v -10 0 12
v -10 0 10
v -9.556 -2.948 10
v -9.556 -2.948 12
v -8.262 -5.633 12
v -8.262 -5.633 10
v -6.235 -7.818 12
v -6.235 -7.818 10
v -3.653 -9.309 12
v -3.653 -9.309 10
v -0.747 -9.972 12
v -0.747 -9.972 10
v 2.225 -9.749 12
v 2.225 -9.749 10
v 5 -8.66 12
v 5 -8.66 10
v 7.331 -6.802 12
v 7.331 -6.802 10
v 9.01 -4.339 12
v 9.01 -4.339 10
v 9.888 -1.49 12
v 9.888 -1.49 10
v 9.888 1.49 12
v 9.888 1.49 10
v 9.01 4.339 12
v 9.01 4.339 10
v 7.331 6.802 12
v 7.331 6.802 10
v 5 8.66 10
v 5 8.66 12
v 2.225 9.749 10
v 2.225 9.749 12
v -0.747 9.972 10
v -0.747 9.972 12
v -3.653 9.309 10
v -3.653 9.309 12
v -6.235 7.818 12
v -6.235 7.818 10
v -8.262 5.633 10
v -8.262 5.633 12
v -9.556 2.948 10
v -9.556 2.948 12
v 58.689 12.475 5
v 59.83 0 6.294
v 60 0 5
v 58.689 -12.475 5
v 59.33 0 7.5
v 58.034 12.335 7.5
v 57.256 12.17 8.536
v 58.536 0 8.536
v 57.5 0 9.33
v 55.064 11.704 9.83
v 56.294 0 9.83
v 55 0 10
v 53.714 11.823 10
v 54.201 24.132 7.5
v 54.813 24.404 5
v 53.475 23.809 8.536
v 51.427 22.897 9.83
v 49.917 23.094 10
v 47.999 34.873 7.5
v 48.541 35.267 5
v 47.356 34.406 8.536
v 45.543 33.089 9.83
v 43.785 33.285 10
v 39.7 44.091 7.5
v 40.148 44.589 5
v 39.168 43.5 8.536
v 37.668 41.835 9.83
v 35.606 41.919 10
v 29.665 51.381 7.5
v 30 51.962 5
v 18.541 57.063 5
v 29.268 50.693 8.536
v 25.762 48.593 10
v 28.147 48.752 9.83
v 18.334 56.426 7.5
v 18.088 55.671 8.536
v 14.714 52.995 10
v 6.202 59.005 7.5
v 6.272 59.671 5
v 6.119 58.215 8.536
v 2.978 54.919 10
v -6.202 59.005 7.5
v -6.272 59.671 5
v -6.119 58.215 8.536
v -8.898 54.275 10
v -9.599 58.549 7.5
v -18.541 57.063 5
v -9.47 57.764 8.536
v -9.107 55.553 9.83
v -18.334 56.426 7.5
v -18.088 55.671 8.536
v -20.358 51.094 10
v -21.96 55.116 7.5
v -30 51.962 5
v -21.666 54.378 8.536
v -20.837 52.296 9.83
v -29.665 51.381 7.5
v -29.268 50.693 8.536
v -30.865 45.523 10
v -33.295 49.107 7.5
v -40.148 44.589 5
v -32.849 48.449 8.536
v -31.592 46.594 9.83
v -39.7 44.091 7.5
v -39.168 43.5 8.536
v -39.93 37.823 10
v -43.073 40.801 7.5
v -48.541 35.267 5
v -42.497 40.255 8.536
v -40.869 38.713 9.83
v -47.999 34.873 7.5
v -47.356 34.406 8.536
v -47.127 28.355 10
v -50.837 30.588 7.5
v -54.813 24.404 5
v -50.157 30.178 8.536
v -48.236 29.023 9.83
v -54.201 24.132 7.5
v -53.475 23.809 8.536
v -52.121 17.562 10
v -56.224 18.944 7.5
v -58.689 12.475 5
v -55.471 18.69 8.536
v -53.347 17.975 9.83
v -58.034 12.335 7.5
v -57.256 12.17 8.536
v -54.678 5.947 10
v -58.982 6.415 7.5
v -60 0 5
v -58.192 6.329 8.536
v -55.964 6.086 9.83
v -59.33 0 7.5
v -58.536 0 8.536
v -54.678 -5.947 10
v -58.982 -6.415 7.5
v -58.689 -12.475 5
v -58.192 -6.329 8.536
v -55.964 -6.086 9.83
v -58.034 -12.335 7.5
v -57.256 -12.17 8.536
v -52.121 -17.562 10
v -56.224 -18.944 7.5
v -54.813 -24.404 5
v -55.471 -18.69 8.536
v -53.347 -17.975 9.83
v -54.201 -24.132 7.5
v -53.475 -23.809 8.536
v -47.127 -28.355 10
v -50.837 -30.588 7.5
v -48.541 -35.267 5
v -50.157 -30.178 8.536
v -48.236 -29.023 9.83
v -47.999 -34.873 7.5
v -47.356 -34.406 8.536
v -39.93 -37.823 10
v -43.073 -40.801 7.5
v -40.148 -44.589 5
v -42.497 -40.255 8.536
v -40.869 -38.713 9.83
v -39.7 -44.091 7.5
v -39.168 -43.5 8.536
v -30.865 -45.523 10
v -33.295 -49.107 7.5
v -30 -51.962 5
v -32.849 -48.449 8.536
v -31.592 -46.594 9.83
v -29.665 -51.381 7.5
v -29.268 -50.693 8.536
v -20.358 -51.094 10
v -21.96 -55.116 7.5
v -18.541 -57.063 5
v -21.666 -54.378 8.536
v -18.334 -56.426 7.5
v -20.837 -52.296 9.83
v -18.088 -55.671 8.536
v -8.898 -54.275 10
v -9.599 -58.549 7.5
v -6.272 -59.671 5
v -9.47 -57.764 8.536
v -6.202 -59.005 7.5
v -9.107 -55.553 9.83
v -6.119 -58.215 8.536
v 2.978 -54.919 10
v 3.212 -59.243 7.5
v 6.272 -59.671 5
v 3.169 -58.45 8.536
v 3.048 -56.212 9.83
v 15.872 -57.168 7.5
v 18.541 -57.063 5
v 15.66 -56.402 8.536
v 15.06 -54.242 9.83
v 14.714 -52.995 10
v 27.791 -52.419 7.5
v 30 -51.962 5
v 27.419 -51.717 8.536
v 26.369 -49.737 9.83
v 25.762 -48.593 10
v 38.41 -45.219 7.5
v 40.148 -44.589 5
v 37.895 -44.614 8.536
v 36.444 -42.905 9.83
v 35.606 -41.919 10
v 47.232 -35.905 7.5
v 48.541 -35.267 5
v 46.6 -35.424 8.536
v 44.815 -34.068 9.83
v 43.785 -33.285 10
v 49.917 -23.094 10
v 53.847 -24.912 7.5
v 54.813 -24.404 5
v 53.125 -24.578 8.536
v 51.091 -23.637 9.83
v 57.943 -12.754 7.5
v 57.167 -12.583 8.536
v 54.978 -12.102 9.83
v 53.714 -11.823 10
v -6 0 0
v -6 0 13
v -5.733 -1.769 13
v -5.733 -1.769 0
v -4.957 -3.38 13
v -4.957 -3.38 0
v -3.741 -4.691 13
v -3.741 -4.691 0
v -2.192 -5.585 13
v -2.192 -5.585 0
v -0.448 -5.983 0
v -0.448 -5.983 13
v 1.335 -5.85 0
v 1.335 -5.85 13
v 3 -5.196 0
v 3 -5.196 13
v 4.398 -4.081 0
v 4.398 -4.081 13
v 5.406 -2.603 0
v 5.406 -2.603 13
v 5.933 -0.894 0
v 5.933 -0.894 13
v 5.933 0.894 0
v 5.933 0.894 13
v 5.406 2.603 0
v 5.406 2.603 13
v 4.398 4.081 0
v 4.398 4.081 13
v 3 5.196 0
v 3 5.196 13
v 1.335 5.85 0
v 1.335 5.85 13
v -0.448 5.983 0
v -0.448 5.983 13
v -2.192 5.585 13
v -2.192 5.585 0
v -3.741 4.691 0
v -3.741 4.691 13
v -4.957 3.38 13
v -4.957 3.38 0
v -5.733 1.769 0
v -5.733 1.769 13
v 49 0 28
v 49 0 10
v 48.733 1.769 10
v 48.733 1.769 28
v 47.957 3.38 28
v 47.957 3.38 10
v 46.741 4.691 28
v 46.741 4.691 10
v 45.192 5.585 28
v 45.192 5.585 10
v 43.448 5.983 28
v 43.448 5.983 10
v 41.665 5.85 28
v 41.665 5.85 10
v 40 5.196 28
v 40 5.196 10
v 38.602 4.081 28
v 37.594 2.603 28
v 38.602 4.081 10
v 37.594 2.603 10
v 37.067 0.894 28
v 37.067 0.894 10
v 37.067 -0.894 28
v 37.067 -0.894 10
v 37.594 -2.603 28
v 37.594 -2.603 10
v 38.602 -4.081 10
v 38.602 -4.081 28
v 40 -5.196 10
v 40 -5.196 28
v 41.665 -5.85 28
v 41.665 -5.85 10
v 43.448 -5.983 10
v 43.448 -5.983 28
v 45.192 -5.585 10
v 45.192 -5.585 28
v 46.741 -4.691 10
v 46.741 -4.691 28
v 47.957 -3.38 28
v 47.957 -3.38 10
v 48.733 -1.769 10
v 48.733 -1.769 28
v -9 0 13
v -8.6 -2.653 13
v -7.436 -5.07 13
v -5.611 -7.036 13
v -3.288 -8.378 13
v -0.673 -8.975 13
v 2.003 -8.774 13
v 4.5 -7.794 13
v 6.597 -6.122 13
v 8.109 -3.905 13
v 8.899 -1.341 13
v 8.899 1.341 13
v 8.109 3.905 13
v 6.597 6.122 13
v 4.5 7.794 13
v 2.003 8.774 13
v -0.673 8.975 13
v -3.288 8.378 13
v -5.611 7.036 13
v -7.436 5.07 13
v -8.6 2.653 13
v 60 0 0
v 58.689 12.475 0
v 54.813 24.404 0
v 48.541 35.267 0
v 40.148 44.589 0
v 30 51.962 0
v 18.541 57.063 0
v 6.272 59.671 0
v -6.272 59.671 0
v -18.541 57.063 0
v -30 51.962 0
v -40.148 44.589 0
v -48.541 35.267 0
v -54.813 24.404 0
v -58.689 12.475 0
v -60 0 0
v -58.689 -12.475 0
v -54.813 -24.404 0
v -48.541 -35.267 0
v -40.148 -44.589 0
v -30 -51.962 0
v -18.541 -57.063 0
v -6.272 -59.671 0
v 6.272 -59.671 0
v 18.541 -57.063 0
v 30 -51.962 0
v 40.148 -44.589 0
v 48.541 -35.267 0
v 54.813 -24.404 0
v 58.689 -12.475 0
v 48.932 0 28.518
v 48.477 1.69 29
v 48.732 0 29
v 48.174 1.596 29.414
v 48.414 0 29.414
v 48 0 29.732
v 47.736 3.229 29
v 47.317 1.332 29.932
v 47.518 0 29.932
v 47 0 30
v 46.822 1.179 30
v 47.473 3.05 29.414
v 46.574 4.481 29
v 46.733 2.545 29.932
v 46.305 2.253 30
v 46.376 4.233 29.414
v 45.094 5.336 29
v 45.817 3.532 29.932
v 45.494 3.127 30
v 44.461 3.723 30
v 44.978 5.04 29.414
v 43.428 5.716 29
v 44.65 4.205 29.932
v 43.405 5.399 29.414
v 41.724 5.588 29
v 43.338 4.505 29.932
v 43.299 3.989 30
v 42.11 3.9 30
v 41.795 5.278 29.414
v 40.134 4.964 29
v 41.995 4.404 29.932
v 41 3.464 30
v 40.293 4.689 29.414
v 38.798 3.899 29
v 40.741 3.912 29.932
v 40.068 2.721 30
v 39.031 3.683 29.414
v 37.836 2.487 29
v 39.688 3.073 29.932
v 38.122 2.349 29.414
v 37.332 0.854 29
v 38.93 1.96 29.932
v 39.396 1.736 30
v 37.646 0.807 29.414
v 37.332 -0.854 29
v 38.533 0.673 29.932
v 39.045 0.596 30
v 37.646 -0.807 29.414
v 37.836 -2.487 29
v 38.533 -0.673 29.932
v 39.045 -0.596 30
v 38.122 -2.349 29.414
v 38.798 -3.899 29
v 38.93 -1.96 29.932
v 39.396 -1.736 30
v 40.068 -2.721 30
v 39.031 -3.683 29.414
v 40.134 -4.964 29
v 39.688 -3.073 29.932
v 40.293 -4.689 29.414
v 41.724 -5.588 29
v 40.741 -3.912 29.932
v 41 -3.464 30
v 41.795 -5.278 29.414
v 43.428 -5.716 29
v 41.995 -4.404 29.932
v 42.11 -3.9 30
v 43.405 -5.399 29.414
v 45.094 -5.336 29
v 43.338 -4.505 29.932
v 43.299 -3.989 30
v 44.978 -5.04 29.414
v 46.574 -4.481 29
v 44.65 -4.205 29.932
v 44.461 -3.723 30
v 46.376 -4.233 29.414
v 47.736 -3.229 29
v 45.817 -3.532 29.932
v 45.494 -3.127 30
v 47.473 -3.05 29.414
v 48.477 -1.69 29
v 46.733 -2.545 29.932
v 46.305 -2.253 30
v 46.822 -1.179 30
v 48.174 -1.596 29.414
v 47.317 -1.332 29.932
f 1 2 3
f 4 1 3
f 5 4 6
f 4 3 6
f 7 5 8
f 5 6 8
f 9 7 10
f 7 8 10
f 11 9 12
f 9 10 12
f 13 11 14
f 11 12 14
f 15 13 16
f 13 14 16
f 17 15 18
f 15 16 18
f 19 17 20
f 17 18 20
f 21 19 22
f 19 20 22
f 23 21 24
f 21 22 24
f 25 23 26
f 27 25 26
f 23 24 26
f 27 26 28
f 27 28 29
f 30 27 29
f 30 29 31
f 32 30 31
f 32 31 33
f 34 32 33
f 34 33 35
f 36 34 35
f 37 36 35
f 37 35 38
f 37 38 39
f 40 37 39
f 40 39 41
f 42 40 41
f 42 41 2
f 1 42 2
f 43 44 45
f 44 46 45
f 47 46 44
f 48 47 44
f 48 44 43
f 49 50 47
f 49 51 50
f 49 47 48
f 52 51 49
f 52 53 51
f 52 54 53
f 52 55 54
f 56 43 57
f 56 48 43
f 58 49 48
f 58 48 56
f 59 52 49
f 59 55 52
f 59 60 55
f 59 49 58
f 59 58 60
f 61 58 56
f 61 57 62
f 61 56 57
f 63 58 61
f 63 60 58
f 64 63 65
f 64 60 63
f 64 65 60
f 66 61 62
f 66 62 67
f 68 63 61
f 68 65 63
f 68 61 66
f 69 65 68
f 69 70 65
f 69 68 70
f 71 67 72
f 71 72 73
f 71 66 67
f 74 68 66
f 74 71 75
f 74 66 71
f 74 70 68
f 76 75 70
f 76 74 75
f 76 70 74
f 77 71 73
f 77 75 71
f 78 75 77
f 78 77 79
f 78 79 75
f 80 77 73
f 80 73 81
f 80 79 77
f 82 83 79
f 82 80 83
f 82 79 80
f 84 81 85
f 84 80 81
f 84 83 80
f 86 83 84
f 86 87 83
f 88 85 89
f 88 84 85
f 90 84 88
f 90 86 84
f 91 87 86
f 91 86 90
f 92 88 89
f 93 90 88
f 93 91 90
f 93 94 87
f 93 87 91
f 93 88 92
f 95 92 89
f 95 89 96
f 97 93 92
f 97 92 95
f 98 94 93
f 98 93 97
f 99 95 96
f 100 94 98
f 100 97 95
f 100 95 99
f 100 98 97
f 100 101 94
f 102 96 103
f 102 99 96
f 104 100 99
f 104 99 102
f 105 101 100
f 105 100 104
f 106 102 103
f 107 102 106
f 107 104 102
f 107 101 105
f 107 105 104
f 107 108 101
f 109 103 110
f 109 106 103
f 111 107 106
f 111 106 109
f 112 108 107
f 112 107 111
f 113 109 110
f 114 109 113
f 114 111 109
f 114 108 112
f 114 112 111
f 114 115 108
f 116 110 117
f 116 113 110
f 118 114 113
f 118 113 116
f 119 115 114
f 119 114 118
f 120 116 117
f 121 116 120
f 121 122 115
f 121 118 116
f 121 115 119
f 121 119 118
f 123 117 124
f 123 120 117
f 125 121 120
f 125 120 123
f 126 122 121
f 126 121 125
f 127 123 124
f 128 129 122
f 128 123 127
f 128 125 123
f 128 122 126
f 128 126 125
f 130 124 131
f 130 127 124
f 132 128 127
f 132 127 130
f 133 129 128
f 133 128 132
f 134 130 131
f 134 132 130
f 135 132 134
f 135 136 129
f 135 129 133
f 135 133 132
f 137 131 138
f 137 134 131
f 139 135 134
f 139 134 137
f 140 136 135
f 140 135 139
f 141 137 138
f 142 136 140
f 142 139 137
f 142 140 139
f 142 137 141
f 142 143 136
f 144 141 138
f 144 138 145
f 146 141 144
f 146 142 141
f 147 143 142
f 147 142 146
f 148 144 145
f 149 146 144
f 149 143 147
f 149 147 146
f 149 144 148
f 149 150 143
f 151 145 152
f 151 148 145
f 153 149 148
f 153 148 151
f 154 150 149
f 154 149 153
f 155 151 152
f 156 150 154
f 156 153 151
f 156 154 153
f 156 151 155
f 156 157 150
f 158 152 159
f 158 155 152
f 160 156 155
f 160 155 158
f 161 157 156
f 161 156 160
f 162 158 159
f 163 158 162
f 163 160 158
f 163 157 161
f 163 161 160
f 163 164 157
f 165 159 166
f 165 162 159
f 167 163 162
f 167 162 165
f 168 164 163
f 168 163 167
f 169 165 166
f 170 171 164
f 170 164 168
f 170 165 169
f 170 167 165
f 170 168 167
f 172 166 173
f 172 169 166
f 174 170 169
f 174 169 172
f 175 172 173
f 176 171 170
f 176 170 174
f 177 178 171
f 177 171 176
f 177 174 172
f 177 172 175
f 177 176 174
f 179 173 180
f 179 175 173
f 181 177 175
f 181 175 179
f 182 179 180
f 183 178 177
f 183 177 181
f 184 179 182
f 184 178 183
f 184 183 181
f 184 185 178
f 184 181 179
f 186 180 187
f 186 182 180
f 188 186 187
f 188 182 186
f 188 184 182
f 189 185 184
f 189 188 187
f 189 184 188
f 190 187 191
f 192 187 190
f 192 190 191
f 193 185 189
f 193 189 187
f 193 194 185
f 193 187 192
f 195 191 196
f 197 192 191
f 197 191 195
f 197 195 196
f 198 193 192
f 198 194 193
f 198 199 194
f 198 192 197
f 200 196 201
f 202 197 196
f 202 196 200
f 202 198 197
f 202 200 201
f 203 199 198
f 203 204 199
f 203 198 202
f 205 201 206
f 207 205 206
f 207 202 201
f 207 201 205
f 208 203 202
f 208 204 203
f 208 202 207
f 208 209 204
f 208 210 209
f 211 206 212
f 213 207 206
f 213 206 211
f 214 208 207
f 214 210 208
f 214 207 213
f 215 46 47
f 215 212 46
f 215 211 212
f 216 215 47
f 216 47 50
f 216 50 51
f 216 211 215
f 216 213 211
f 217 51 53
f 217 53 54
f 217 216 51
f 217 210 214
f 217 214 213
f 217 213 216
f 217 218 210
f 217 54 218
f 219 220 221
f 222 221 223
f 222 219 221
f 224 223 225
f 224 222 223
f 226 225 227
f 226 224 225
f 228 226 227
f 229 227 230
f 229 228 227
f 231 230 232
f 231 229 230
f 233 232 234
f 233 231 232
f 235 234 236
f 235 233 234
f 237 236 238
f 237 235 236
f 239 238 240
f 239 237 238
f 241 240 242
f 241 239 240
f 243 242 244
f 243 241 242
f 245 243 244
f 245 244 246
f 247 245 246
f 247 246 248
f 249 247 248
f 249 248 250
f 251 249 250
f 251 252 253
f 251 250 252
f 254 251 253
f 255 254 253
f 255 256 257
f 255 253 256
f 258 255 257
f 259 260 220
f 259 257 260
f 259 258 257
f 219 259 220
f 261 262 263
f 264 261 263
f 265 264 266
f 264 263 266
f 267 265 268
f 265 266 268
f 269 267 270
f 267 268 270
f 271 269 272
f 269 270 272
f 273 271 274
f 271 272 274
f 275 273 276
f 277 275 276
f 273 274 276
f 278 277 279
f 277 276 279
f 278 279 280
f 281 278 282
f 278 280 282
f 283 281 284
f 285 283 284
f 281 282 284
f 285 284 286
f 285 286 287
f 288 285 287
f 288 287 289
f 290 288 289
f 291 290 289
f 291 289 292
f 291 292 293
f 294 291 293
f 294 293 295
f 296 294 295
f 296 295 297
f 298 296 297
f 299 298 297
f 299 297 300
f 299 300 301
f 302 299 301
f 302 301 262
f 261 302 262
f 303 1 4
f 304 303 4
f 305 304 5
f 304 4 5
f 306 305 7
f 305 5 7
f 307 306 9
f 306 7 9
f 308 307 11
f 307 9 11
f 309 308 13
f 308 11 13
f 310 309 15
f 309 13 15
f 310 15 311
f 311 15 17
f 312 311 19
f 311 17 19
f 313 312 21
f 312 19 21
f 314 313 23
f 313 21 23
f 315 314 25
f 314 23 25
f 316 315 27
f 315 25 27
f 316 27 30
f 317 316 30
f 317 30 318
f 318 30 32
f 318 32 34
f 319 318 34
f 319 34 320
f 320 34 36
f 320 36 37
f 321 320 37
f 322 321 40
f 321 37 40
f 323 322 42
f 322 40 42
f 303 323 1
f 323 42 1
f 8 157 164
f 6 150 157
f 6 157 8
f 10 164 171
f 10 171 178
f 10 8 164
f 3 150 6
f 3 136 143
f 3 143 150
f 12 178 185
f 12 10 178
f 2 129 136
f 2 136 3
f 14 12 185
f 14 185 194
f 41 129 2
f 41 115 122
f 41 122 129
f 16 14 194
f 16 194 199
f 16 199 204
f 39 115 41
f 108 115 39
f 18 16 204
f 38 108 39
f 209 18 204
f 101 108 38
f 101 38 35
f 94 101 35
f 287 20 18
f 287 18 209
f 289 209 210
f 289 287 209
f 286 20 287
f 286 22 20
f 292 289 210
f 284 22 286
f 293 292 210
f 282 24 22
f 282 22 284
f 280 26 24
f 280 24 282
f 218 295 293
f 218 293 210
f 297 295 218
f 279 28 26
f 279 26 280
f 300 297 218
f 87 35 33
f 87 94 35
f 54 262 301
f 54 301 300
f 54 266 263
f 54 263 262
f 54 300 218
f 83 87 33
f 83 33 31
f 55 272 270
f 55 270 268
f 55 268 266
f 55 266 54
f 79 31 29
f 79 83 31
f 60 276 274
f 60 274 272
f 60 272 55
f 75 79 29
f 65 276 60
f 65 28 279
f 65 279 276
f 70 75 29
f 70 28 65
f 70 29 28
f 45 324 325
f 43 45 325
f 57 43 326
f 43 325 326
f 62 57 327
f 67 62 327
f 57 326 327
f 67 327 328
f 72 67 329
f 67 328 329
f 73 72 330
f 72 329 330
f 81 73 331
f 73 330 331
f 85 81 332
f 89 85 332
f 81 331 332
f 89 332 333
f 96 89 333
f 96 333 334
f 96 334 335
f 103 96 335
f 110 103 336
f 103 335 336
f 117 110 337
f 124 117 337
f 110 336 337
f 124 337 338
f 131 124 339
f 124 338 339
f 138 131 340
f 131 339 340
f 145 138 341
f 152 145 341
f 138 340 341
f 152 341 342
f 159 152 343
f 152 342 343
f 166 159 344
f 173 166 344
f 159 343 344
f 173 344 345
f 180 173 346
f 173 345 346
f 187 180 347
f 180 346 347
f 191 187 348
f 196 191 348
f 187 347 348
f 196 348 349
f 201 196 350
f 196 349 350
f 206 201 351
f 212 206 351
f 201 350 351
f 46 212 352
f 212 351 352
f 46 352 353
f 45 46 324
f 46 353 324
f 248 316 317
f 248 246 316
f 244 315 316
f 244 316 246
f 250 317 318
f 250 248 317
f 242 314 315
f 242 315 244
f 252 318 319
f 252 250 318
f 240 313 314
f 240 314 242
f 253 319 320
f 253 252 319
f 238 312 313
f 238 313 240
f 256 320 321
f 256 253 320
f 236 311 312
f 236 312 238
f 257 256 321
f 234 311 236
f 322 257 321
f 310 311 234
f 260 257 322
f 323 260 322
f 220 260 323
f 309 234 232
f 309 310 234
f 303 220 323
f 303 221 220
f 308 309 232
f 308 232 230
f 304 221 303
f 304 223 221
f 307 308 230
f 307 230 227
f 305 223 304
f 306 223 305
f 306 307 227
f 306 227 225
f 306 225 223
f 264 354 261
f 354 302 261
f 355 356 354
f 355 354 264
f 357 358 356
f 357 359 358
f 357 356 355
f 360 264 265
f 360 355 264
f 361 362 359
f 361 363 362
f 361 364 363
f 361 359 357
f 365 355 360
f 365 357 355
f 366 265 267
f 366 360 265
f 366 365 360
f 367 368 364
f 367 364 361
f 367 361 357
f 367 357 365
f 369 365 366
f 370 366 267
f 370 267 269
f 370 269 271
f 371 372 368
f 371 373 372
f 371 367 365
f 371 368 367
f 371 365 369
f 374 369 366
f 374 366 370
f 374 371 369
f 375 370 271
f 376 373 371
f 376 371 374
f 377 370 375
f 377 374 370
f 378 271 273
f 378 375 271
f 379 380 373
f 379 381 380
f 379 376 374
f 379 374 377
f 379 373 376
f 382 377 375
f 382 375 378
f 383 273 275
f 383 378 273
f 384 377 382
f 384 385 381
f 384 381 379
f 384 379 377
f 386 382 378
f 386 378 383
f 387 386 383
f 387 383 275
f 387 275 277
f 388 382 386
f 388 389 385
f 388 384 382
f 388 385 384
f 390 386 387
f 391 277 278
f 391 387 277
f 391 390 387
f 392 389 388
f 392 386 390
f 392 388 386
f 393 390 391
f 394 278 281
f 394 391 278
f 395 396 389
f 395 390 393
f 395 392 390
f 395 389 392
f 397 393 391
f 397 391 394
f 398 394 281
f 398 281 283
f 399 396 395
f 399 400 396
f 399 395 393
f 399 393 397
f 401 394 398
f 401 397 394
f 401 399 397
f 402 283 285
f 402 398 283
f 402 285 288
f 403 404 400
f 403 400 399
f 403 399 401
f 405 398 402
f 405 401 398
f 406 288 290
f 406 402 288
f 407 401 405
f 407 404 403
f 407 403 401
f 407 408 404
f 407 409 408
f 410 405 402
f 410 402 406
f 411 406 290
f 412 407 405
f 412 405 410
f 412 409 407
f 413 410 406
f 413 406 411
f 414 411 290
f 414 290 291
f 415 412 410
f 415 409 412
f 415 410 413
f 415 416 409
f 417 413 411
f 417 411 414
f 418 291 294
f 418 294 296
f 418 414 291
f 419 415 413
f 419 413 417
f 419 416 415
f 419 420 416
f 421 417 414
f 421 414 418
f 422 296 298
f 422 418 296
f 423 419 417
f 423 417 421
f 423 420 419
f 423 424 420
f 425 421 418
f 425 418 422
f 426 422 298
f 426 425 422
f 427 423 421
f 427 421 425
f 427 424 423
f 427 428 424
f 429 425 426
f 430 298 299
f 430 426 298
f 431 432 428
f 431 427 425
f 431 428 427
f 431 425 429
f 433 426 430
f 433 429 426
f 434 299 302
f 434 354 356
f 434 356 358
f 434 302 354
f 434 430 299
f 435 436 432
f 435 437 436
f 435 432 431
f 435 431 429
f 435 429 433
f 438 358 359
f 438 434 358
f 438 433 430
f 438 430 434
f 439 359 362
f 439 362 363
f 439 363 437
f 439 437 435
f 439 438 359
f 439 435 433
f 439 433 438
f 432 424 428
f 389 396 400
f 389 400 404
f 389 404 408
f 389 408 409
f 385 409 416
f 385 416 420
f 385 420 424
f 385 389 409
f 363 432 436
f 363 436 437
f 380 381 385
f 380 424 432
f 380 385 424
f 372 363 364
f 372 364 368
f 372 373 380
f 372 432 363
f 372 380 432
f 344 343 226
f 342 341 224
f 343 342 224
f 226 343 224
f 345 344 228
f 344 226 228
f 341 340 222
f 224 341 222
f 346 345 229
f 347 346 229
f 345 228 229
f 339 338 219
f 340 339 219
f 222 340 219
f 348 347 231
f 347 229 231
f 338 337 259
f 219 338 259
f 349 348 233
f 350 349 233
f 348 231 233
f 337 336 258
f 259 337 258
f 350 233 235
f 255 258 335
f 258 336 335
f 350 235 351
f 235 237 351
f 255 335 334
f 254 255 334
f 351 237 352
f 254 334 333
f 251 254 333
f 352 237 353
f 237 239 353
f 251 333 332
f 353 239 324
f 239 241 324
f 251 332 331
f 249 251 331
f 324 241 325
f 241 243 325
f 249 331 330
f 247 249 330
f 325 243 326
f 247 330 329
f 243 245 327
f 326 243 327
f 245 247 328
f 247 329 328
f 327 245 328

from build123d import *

# Parameters (mm, degrees)
SKETCH1_R           = 60
BOSS_EXTRUDE1_DEPTH = 10
FILLET1_R           = 5
SKETCH2_R           = 10
BOSS_EXTRUDE3_DEPTH = 13
SKETCH2_3_R         = 6
CUT_EXTRUDE1_DEPTH  = 86.842879728
CHAMFER1_SIZE       = 1
SKETCH3_R           = 6
BOSS_EXTRUDE4_DEPTH = 30
FILLET2_R           = 2


with BuildPart() as part:
    # Sketch1 → Boss-Extrude1 (new body)
    with BuildSketch(Plane.XY):
        Circle(SKETCH1_R)
    extrude(amount=BOSS_EXTRUDE1_DEPTH)

    # Fillet1
    fillet1_edges = [part.edges().sort_by_distance(p)[0] for p in [
        (-60, 0, 10),
    ]]
    fillet(fillet1_edges, radius=FILLET1_R)

    # Sketch2 → Boss-Extrude3 (add)
    with BuildSketch(Plane.XY):
        Circle(SKETCH2_R)
    extrude(amount=BOSS_EXTRUDE3_DEPTH)

    # Sketch2<3> → Cut-Extrude1 (cut, through all)
    with BuildSketch(Plane.XY):
        Circle(SKETCH2_3_R)
    extrude(amount=CUT_EXTRUDE1_DEPTH, mode=Mode.SUBTRACT)

    # Chamfer1
    chamfer1_edges = [part.edges().sort_by_distance(p)[0] for p in [
        (-10, 0, 13),
    ]]
    chamfer(chamfer1_edges, length=CHAMFER1_SIZE)

    # Sketch3 → Boss-Extrude4 (add)
    with BuildSketch(Plane.XY):
        with Locations((43, 0)):
            Circle(SKETCH3_R)
    extrude(amount=BOSS_EXTRUDE4_DEPTH)

    # Fillet2
    fillet2_edges = [part.edges().sort_by_distance(p)[0] for p in [
        (37, 0, 30),
    ]]
    fillet(fillet2_edges, radius=FILLET2_R)


solid = part.part
